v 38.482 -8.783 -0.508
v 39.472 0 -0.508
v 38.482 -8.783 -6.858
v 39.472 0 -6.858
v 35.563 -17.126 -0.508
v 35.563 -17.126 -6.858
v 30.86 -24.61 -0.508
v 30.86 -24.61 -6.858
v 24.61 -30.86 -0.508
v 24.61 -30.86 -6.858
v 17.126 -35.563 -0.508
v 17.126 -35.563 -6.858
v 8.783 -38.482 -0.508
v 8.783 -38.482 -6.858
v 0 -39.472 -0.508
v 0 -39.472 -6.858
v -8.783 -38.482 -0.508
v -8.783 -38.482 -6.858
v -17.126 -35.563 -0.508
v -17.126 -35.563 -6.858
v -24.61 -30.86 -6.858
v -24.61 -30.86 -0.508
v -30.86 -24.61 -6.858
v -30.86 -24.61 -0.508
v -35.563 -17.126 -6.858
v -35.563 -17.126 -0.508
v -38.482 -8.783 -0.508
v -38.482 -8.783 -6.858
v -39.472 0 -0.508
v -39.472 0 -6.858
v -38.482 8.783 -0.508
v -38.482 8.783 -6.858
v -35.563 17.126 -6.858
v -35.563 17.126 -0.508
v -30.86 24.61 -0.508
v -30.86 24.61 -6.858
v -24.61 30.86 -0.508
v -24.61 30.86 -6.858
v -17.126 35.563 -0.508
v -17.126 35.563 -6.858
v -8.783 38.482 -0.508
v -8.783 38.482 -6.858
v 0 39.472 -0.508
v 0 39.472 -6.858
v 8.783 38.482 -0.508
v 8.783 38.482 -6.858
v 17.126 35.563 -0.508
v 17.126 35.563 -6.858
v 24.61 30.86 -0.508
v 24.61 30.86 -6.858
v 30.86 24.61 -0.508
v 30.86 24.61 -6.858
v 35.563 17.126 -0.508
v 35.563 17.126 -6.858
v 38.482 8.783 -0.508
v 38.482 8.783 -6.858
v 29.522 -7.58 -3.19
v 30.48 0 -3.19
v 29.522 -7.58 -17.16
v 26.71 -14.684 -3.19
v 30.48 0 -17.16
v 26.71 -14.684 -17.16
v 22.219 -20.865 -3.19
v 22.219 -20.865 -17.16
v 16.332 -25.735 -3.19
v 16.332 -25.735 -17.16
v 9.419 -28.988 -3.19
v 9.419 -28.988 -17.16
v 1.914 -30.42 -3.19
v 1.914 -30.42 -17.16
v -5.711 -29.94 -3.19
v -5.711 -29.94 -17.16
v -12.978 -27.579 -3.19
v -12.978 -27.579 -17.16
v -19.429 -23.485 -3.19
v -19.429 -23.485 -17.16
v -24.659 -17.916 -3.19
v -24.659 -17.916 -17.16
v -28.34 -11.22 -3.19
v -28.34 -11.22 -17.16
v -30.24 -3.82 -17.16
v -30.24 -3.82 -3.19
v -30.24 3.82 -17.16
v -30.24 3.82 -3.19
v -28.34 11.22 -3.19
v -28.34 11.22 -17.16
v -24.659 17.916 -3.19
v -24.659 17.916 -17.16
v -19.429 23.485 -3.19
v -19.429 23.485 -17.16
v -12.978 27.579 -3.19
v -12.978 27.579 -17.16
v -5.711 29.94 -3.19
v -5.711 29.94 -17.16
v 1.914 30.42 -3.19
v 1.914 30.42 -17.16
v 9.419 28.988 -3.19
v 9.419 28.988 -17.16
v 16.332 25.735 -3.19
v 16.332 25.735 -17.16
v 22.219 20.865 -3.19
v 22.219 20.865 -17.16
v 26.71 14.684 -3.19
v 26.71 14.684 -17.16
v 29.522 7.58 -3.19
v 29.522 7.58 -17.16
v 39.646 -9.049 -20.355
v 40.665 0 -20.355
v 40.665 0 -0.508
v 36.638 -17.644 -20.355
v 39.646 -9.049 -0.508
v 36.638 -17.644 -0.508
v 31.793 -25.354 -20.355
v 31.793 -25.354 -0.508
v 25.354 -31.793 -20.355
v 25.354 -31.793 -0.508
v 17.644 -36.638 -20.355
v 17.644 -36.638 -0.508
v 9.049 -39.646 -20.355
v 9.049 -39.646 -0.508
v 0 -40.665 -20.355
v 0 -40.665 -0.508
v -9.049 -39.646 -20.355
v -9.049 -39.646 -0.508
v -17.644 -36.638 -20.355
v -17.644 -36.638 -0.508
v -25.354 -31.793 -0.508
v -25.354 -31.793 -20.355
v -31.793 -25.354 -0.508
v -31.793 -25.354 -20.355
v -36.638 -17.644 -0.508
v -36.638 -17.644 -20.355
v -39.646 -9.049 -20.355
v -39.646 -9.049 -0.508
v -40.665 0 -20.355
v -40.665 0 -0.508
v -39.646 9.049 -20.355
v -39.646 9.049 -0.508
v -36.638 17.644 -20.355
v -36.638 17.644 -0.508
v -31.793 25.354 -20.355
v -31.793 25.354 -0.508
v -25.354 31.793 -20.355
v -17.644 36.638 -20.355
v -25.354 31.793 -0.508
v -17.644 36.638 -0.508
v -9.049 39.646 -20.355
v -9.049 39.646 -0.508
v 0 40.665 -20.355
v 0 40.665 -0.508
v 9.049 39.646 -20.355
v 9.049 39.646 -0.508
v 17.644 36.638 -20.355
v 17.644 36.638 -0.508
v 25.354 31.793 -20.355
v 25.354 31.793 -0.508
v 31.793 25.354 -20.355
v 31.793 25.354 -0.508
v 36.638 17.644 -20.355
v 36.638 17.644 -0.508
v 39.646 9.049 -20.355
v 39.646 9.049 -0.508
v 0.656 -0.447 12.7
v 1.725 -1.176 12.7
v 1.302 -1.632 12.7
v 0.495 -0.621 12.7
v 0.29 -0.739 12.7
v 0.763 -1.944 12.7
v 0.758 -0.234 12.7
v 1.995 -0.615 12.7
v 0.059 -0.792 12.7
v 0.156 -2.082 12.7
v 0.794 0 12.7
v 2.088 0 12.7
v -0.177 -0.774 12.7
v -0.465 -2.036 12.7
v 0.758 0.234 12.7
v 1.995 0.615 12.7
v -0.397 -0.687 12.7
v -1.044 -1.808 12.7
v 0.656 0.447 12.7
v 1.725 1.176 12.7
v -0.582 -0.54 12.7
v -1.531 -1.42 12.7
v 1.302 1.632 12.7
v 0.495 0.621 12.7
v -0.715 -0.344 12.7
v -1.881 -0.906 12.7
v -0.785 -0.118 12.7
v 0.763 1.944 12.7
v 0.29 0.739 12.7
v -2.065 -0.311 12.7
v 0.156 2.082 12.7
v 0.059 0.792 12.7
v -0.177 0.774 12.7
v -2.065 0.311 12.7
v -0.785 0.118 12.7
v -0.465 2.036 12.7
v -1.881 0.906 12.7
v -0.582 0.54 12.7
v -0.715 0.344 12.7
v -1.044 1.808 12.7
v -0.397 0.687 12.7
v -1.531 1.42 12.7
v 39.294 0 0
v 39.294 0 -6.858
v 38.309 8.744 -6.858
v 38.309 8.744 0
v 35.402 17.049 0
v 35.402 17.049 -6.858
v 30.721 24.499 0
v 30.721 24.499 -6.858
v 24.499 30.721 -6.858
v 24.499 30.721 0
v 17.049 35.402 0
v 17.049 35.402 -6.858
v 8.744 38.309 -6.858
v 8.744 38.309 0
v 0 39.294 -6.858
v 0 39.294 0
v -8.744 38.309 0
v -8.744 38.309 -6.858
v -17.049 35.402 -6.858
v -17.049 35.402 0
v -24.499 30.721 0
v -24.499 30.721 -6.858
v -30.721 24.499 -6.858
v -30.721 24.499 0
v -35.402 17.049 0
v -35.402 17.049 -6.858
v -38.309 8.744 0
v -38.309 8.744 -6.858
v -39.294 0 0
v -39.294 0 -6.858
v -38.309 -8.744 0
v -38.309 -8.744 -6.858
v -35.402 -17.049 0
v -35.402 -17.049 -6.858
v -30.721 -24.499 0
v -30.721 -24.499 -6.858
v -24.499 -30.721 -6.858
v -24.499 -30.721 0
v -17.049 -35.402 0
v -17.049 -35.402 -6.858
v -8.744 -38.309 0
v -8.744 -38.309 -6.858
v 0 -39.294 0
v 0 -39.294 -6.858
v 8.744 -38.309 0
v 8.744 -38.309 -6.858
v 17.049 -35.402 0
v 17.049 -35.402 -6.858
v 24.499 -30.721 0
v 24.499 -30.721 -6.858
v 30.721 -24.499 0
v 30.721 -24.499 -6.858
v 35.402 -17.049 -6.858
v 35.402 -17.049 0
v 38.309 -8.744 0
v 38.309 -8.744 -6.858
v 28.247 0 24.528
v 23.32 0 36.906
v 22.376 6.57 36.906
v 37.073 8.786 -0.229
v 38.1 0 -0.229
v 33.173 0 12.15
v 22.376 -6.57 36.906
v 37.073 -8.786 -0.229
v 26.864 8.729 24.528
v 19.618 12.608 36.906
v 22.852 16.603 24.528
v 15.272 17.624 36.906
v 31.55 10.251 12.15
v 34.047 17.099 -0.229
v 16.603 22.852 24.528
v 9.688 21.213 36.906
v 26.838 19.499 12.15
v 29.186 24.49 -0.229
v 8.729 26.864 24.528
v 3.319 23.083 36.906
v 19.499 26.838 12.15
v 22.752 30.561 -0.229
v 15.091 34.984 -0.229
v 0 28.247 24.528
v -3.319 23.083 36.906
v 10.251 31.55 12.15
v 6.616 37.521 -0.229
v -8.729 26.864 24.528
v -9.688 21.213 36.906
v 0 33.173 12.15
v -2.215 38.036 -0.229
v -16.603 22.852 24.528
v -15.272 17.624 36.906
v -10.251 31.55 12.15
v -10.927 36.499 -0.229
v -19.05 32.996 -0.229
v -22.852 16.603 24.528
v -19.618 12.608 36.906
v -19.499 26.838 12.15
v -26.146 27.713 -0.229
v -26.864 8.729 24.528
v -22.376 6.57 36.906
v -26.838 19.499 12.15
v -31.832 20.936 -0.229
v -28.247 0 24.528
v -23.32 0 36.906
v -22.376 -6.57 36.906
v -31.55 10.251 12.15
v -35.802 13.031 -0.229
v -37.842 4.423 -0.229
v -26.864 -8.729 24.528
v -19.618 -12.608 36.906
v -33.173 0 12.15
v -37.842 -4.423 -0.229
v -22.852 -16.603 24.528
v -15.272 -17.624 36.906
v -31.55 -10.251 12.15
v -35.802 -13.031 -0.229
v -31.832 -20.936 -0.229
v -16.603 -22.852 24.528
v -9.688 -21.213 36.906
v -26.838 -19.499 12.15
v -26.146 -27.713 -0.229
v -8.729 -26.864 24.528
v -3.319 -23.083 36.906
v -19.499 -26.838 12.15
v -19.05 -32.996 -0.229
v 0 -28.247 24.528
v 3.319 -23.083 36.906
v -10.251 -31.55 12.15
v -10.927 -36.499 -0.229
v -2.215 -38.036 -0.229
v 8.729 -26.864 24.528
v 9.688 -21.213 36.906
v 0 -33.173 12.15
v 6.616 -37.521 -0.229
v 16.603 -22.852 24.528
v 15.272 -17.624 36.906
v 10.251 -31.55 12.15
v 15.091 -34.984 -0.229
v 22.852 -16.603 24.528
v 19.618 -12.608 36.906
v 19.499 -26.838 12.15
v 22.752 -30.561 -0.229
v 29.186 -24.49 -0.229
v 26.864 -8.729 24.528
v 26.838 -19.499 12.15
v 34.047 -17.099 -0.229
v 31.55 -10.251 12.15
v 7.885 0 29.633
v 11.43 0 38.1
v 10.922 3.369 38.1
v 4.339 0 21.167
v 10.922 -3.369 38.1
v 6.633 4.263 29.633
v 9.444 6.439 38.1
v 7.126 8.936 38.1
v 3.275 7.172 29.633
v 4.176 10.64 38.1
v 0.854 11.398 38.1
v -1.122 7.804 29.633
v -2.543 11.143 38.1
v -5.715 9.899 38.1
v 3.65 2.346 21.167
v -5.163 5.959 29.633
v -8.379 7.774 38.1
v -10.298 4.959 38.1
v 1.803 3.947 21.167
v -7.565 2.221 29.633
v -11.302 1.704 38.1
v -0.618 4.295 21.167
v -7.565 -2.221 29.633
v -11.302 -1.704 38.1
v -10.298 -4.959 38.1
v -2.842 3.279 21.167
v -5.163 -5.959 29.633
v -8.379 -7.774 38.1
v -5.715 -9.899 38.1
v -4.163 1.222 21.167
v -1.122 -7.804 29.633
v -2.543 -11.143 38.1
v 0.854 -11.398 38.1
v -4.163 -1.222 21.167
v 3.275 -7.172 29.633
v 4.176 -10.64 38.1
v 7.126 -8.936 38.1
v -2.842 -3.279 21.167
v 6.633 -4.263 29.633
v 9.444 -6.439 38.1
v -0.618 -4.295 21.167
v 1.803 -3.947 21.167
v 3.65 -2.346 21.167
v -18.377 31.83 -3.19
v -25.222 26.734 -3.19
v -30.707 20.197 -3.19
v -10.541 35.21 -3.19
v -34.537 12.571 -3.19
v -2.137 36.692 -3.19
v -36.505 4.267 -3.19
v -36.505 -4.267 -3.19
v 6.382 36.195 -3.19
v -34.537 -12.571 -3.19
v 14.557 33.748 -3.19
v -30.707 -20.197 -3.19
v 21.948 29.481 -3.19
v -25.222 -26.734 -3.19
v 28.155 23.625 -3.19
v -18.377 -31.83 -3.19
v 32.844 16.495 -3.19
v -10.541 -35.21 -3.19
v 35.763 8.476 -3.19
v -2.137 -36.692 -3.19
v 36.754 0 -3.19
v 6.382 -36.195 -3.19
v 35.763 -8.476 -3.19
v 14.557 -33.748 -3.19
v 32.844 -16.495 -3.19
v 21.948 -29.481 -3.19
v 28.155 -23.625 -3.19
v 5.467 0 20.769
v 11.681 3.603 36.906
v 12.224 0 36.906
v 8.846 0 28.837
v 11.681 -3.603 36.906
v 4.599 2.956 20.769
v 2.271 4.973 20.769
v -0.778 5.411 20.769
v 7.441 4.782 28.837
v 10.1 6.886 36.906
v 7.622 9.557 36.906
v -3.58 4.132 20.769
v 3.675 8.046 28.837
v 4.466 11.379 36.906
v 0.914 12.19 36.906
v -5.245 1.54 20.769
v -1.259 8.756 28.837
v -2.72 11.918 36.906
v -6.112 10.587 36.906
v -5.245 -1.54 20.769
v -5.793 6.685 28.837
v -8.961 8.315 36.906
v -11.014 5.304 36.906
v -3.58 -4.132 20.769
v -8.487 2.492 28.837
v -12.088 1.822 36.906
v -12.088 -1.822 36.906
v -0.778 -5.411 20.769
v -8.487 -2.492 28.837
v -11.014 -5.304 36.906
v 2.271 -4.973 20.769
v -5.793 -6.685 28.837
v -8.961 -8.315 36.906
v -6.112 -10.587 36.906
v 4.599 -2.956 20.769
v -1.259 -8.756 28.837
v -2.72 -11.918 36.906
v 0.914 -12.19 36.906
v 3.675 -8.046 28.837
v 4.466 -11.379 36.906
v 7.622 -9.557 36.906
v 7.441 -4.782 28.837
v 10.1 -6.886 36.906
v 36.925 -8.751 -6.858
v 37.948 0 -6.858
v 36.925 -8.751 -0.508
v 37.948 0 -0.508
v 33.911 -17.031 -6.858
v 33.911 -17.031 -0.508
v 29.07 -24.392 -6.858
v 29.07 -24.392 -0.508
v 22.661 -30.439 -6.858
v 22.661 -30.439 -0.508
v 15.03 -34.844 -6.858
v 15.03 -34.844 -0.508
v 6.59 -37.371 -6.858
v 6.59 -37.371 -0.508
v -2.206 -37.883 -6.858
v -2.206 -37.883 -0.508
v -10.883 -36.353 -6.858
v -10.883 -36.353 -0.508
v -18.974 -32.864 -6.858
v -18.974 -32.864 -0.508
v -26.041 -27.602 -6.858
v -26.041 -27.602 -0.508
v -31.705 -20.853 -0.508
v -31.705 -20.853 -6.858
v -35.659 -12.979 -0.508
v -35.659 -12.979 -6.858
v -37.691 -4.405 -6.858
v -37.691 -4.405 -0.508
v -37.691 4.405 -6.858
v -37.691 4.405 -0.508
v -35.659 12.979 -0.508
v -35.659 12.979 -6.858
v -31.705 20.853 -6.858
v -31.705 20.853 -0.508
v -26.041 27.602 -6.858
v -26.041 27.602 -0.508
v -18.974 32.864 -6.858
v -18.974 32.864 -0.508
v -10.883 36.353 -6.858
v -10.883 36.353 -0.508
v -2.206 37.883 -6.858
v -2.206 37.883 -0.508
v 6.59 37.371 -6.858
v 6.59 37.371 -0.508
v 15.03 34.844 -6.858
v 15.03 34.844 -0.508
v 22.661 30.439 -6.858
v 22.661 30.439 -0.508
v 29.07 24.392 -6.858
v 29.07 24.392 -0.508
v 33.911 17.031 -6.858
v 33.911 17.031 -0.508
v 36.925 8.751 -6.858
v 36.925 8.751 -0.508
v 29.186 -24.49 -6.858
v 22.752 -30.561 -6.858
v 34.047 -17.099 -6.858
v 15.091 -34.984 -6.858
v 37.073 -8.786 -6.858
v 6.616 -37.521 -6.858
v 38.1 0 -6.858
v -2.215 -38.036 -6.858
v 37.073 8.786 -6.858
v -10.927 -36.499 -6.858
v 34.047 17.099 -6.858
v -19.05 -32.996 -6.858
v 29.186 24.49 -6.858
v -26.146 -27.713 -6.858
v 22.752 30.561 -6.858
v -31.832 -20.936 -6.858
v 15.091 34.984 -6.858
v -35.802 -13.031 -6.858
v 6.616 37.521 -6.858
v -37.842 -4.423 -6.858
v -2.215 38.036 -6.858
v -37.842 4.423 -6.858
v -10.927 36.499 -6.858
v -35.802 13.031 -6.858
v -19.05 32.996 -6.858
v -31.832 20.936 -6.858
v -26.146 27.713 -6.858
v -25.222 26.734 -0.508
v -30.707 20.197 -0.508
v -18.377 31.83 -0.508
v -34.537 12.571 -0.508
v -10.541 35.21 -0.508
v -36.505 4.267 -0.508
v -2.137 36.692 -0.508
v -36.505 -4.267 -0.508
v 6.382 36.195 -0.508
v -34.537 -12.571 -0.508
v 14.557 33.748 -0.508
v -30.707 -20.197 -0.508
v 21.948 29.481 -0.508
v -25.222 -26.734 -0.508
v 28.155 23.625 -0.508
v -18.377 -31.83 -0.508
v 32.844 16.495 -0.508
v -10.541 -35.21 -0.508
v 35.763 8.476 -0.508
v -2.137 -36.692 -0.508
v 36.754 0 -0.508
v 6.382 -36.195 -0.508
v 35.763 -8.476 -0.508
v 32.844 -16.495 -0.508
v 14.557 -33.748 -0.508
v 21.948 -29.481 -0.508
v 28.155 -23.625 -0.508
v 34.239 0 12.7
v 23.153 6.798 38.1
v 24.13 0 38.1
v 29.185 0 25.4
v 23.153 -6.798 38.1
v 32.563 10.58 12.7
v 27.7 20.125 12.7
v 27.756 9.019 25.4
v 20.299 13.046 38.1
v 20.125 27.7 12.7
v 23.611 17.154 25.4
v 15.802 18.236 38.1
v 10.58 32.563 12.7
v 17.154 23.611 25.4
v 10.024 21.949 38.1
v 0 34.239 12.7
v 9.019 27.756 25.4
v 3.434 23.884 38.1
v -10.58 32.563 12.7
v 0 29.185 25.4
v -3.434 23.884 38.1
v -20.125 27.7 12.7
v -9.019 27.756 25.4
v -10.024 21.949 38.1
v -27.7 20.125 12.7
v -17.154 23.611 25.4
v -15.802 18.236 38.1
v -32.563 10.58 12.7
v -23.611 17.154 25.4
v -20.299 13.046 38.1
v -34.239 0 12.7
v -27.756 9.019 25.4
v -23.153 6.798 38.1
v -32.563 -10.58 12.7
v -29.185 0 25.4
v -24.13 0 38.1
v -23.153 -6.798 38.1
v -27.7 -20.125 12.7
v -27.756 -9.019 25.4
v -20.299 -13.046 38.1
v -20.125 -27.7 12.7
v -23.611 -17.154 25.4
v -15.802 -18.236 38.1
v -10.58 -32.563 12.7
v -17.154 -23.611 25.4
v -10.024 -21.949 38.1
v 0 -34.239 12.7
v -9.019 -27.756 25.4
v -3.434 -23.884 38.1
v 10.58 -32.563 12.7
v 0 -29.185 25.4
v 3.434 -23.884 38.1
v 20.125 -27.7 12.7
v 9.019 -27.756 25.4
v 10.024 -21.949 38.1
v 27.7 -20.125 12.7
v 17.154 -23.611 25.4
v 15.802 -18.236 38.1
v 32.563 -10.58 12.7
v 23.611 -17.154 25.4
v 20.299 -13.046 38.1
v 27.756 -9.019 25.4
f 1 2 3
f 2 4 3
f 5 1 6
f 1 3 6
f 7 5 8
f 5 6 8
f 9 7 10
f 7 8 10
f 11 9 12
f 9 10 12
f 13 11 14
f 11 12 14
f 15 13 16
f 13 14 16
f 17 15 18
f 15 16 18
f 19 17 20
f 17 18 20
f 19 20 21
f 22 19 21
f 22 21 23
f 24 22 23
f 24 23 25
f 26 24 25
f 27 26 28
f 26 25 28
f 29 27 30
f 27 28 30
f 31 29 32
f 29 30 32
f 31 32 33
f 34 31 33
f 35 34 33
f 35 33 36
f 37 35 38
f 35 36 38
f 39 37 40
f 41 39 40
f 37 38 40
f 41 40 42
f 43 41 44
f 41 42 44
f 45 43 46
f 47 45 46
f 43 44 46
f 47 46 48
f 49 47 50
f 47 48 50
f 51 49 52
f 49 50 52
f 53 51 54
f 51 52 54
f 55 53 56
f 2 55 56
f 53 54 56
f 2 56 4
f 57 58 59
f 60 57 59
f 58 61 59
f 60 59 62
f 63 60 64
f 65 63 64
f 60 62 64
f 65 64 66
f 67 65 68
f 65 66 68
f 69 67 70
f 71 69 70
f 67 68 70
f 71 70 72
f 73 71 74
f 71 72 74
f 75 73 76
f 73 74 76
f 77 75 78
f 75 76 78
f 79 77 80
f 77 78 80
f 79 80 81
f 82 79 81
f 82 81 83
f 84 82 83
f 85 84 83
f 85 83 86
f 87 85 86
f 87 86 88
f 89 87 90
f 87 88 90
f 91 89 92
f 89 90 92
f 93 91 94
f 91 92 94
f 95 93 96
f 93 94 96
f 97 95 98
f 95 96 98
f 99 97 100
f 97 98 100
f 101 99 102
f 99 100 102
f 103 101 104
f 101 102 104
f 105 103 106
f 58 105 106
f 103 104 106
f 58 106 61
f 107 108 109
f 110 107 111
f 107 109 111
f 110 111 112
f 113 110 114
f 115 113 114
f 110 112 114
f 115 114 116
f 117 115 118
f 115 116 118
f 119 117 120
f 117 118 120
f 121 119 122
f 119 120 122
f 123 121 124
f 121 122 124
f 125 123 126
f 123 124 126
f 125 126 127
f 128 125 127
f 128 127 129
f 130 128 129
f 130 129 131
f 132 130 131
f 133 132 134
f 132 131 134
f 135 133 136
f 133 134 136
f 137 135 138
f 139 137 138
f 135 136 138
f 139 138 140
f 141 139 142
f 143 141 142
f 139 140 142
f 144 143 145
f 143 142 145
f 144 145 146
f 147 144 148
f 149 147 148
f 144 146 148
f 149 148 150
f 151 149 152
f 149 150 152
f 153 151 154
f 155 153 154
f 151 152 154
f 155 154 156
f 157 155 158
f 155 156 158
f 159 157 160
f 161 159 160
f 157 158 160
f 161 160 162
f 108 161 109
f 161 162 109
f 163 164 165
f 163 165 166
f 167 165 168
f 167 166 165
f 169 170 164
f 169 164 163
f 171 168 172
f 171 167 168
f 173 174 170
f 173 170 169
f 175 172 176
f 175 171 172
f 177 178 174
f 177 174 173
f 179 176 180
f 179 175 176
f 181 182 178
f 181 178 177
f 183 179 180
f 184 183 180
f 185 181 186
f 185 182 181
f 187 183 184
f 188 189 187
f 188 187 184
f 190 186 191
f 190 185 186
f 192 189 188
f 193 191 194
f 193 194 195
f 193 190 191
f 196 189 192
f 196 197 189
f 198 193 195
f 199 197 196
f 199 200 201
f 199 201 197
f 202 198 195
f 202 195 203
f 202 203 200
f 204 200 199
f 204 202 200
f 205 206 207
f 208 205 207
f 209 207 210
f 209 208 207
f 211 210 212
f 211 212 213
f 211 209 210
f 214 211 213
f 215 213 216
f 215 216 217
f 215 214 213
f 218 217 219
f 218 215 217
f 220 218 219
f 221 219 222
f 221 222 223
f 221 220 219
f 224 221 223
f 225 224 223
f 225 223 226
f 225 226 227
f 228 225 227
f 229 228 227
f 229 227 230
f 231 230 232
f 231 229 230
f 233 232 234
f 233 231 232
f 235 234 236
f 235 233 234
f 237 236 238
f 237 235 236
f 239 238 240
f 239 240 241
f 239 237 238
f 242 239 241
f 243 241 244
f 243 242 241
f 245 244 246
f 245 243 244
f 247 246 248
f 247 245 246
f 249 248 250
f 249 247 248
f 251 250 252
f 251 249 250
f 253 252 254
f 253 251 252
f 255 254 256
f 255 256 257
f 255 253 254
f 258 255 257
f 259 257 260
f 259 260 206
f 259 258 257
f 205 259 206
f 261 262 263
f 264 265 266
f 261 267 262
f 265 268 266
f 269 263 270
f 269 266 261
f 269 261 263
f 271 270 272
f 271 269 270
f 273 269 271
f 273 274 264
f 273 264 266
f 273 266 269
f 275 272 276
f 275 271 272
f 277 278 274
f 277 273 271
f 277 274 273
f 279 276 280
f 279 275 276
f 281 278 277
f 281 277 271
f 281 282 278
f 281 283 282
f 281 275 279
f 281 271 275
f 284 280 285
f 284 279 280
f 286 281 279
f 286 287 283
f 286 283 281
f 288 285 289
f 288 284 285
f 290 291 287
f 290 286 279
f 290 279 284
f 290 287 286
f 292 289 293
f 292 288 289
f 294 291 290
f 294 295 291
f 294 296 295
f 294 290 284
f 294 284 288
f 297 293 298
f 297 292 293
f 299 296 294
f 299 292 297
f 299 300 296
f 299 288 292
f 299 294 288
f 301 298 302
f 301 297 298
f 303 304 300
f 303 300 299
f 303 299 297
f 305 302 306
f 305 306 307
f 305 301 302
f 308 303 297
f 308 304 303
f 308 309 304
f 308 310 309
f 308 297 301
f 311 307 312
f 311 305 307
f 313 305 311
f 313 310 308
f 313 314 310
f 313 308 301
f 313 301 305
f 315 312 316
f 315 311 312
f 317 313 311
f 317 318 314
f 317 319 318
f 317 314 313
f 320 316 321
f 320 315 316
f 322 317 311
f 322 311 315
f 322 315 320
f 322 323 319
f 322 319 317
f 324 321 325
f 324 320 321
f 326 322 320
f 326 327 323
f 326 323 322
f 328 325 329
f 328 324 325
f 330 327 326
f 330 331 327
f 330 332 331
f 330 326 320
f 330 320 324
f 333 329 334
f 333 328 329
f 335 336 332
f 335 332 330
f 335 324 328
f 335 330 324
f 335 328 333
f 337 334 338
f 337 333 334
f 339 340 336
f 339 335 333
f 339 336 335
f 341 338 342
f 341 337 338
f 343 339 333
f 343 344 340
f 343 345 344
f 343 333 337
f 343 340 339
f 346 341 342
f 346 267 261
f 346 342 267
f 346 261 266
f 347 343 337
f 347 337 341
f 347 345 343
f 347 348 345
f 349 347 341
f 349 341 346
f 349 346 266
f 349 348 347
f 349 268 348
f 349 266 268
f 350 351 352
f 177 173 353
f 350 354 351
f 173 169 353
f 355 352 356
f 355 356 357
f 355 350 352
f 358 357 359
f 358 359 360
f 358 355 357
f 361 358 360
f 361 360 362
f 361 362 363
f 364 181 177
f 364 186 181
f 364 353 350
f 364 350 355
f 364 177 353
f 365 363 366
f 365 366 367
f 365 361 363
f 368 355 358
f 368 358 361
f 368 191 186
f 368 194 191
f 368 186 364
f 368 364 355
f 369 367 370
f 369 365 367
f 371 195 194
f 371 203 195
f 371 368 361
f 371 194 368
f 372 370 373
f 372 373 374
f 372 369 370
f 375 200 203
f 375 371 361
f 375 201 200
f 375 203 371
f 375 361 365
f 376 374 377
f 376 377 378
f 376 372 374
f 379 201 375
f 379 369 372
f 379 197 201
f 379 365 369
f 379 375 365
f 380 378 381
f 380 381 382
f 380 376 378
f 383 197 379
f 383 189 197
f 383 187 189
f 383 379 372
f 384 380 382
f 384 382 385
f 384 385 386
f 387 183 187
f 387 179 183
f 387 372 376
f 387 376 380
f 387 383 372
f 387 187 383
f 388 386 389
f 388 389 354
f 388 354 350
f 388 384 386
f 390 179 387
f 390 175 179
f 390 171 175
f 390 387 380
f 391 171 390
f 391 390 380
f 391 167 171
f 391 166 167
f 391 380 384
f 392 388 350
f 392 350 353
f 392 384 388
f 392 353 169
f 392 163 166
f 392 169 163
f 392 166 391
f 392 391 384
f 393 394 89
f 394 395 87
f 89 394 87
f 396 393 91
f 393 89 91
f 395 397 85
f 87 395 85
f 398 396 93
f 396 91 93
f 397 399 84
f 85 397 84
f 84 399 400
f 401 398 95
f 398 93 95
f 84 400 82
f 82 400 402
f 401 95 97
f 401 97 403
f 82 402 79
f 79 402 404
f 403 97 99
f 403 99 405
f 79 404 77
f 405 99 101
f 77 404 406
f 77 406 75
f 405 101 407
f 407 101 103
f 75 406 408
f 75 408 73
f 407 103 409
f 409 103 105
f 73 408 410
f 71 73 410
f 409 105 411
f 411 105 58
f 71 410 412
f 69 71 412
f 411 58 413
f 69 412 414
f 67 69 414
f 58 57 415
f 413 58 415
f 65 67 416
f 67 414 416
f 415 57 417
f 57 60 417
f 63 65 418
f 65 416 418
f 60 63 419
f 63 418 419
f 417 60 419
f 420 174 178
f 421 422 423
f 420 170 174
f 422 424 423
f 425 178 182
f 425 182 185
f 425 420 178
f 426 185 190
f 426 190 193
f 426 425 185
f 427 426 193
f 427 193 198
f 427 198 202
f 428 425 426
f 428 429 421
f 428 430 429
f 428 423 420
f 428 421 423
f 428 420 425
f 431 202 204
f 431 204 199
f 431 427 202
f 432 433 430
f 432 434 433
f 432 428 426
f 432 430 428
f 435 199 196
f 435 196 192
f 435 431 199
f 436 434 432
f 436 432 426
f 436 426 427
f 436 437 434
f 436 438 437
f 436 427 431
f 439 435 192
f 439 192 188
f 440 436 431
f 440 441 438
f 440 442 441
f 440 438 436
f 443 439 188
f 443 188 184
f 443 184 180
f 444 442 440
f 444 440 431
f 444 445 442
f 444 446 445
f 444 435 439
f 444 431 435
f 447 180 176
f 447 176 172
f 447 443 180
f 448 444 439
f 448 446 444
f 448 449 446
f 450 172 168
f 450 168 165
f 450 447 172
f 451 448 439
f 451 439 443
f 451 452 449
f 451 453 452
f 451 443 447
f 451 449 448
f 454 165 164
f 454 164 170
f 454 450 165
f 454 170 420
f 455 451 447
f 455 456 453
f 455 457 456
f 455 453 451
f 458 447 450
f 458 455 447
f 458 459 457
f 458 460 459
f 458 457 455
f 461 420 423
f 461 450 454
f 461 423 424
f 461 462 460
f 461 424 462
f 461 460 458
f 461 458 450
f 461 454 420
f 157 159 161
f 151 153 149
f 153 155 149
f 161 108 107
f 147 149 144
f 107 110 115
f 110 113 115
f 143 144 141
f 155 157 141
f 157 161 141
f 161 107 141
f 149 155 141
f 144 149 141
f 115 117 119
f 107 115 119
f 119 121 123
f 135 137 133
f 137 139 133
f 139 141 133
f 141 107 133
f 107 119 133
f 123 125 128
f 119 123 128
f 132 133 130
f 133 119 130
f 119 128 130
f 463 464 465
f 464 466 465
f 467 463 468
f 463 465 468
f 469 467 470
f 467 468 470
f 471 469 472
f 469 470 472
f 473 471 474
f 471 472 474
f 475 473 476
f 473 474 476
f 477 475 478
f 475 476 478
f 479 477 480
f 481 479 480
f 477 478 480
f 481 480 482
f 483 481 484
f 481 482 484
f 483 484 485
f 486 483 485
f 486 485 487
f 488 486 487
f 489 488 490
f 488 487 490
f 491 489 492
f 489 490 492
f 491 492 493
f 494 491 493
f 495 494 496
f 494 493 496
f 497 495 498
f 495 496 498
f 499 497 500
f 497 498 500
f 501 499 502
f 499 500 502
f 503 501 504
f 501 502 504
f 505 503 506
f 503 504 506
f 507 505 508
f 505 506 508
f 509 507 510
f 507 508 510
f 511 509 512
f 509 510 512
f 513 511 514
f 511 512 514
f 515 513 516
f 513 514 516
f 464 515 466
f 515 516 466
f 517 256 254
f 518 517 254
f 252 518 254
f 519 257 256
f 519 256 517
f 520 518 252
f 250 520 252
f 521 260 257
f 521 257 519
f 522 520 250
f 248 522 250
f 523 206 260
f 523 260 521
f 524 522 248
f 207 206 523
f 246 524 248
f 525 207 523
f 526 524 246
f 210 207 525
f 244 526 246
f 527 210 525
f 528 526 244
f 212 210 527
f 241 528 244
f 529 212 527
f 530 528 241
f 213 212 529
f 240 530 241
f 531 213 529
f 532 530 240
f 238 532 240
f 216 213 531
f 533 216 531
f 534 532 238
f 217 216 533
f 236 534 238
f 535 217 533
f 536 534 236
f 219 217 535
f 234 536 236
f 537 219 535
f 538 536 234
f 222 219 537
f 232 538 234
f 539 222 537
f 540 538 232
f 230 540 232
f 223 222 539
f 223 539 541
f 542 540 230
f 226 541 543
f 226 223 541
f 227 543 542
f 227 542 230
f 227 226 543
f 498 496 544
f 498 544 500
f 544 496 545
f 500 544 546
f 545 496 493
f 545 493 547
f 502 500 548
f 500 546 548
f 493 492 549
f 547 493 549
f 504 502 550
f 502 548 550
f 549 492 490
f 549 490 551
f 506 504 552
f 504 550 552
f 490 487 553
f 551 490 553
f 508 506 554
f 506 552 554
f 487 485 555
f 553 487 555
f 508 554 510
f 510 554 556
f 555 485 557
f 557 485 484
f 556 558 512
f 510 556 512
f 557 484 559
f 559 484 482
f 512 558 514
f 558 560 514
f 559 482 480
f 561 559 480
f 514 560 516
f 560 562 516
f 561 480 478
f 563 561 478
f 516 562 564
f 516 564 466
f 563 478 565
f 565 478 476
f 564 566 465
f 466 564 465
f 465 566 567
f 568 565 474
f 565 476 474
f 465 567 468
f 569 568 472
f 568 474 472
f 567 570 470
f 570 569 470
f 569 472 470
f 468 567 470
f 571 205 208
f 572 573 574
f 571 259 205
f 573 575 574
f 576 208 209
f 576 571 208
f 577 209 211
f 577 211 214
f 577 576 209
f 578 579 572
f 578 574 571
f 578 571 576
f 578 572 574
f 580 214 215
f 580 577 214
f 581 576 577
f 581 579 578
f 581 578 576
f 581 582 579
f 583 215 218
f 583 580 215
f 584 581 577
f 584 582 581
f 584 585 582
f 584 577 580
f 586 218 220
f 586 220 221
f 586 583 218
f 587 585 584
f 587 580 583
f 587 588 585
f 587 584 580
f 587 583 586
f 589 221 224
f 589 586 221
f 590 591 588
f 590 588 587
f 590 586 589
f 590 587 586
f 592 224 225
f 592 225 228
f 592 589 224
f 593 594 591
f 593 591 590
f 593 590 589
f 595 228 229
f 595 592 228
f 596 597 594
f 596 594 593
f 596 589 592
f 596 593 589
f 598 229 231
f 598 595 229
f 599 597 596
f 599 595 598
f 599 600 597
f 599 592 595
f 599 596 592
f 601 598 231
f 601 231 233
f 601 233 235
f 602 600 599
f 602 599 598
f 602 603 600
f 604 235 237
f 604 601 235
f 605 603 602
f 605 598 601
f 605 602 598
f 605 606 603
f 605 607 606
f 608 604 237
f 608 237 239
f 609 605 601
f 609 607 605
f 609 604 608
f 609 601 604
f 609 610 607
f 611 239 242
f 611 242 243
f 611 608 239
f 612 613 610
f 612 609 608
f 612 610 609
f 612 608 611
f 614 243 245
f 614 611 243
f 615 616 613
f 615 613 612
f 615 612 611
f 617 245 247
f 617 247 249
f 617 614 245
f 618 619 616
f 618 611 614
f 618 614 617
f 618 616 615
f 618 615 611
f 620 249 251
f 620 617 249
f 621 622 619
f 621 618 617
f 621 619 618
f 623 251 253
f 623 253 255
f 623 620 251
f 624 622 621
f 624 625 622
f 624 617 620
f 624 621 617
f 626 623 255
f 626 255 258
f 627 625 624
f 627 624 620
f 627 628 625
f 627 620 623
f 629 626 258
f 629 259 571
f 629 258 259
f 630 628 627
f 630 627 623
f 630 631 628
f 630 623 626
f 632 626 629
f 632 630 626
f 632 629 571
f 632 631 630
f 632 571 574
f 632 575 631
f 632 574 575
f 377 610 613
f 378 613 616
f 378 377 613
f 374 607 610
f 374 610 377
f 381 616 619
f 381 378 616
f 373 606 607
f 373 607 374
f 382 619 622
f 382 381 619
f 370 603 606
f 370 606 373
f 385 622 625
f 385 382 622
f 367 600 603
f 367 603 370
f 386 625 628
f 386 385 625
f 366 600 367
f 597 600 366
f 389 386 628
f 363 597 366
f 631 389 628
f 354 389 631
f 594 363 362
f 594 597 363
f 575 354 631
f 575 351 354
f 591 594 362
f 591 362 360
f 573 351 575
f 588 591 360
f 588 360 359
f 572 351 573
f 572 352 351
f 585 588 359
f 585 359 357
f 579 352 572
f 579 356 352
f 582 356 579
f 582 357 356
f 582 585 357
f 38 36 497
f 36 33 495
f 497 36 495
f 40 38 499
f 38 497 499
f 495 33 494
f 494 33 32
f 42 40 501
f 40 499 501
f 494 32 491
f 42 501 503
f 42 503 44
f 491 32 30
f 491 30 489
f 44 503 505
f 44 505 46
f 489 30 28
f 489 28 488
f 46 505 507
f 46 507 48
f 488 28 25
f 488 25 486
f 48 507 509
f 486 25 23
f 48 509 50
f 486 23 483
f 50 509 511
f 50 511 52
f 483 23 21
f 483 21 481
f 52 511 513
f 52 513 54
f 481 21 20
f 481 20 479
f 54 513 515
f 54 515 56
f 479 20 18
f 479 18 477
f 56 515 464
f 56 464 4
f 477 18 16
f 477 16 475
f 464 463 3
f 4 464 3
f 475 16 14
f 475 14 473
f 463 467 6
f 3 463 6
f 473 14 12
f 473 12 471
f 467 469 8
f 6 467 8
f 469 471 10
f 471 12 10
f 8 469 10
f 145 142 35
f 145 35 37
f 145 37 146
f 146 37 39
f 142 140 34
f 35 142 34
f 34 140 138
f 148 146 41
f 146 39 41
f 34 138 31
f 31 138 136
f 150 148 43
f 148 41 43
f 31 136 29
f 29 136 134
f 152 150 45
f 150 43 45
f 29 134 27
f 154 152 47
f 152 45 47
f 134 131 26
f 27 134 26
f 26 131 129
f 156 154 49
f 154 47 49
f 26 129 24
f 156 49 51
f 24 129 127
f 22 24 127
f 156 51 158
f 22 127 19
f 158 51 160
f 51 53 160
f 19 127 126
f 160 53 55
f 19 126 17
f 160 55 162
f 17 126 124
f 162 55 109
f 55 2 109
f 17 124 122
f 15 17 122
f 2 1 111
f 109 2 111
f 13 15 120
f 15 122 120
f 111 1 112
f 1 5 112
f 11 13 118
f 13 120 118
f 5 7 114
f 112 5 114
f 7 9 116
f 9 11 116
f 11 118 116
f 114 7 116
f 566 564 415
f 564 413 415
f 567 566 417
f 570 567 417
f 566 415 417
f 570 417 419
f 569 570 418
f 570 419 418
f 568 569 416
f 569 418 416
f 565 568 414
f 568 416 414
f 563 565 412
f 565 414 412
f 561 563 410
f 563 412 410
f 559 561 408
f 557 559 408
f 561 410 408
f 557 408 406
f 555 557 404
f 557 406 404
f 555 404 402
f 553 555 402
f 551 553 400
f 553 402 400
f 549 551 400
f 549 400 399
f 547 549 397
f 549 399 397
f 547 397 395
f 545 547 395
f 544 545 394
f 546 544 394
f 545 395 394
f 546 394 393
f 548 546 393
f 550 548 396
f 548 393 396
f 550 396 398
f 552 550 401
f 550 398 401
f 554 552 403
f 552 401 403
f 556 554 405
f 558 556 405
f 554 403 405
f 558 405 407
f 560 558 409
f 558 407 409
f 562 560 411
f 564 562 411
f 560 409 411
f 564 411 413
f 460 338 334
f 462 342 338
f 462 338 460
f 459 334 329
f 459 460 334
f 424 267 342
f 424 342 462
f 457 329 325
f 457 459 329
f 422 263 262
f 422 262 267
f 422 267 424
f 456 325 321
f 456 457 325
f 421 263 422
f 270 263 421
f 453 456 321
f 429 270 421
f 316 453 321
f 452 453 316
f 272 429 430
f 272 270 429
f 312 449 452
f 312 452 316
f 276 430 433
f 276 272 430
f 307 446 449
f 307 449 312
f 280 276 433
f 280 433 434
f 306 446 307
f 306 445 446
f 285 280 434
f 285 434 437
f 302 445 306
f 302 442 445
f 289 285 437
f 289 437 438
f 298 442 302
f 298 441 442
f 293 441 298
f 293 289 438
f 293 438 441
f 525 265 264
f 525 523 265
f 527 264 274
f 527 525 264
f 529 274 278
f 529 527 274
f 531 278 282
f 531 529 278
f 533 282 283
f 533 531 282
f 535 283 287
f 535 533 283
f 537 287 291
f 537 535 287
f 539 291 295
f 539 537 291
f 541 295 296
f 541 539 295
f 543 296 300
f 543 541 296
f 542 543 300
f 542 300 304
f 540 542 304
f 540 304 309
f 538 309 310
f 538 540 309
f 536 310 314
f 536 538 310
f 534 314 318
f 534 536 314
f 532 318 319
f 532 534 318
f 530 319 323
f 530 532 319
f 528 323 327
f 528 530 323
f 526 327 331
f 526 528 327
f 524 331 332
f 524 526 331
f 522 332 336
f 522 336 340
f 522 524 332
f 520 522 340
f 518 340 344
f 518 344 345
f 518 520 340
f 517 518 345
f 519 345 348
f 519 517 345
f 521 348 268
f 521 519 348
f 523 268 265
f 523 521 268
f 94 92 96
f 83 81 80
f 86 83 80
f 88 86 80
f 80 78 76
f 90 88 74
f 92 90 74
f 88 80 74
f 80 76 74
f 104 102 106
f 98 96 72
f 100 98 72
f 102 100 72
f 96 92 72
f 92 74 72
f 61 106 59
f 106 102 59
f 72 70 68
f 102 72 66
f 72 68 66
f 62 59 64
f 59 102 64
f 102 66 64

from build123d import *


with BuildPart() as f2:
    # F0 (on Front) → F2 (revolve)
    with BuildSketch(Plane.XZ):
        Polygon((39.2938, -6.858), (39.2938, 0), (24.13, 38.1), (11.43, 38.1), (0.79375, 12.7), (2.087992, 12.7), (12.224338, 36.9062), (23.320255, 36.9062), (38.1, -0.228837), (38.1, -6.858), align=None)
    revolve(axis=Axis((0, 0, 30.824983), (0, 0, 1)))


with BuildPart() as f5:
    # F3 (on Front) → F5 (revolve)
    with BuildSketch(Plane.XZ):
        Polygon((40.6654, -20.355182), (40.6654, -0.508), (39.4716, -0.508), (39.4716, -6.858), (37.9476, -6.858), (37.9476, -0.508), (36.7538, -0.508), (36.7538, -3.189887), (30.48, -3.189887), (30.48, -17.159887), (0, -17.159887), (0, -20.355182), align=None)
    revolve(axis=Axis((0, 0, -6.985675), (0, 0, -1)))


solid = Compound([f2.part, f5.part])
